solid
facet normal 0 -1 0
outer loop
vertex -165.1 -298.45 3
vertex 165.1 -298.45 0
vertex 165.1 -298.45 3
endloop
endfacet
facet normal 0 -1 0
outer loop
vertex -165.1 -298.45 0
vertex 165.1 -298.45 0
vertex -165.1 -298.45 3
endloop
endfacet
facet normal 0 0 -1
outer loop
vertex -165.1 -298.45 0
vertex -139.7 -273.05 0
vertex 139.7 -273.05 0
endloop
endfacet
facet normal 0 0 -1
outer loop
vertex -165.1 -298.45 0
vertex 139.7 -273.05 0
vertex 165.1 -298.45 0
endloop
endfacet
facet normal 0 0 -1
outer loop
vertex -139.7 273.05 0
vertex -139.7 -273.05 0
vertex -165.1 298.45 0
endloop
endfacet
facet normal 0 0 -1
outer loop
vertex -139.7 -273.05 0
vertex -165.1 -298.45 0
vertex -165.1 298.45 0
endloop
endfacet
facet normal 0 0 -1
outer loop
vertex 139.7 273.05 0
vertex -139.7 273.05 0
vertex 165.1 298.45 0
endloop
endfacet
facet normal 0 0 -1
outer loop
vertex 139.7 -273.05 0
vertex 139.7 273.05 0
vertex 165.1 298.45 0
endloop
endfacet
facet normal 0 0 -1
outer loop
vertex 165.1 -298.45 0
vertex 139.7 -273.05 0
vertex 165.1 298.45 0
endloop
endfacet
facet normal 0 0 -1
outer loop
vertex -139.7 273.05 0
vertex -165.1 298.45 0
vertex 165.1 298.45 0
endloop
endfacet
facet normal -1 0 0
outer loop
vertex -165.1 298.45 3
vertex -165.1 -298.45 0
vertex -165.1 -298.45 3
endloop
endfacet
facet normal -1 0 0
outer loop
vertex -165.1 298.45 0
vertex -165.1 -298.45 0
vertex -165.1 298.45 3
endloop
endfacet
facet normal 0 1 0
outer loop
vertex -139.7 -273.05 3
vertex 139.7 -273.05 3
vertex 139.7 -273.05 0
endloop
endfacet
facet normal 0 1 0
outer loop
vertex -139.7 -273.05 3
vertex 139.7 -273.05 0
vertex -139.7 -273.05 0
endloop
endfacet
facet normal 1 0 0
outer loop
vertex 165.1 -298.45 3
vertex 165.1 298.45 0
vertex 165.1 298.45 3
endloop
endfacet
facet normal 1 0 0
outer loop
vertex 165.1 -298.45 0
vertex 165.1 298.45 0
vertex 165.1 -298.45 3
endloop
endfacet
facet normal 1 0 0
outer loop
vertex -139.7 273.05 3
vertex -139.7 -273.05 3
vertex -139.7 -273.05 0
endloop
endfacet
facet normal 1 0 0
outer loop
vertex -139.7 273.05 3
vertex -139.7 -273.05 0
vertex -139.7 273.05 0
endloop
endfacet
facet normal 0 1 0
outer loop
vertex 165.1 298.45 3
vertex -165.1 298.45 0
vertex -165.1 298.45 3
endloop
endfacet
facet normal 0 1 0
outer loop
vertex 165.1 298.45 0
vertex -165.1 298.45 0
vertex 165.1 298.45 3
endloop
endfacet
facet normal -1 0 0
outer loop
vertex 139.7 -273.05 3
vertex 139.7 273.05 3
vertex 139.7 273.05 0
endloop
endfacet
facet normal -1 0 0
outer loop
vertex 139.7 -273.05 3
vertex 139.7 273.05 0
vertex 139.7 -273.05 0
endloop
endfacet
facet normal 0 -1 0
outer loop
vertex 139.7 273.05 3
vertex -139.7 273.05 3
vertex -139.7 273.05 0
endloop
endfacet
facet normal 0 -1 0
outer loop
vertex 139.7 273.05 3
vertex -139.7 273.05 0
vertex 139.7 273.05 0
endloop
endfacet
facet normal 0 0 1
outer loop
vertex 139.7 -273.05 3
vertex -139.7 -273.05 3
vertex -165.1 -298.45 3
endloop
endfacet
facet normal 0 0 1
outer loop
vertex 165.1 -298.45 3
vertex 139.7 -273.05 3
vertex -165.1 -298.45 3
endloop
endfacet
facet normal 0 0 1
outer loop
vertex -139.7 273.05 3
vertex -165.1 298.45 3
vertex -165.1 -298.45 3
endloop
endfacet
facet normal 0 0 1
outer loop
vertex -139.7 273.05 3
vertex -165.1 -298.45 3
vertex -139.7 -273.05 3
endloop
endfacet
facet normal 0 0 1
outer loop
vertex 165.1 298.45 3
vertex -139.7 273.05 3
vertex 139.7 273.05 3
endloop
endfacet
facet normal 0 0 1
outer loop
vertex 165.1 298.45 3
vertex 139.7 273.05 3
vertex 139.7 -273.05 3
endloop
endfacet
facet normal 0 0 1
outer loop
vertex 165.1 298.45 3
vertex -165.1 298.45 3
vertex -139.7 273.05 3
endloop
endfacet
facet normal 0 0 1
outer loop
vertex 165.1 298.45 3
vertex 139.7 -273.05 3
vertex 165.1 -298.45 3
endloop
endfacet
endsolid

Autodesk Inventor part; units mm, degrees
ref_plane "YZ Plane" through (0, 0, 0) normal (1, 0, 0) x (0, 1, 0)
ref_plane "XZ Plane" through (0, 0, 0) normal (0, 1, 0) x (-1, 0, 0)
ref_plane "XY Plane" through (0, 0, 0) normal (0, 0, 1) x (1, 0, 0)
sketch "Sketch1" plane through (0, 0, 0) normal (0, 0, 1) x (1, 0, 0)
  line L0 (-165.1, 298.45) -> (165.1, 298.45)
  line L1 (165.1, 298.45) -> (165.1, -298.45)
  line L2 (165.1, -298.45) -> (-165.1, -298.45)
  line L3 (-165.1, -298.45) -> (-165.1, 298.45)
  point P0 (0, 0)
  point P1 (0, 298.45)
  point P2 (-165.1, 0)
  dimension "d0" = 330.2
  dimension "d1" = 596.9
extrude "Extrusion1" add sketch "Sketch1" along normal blind 3
sketch "Sketch2" plane through (0, 0, 3) normal (0, 0, 1) x (1, 0, 0)
  line L0 (165.1, 298.45) -> (165.1, -298.45) projected
  line L1 (-165.1, 298.45) -> (165.1, 298.45) projected
  line L2 (-165.1, -298.45) -> (-165.1, 298.45) projected
  line L3 (165.1, -298.45) -> (-165.1, -298.45) projected
  line L4 (-139.7, 273.05) -> (139.7, 273.05)
  line L5 (139.7, 273.05) -> (139.7, -273.05)
  line L6 (139.7, -273.05) -> (-139.7, -273.05)
  line L7 (-139.7, -273.05) -> (-139.7, 273.05)
  point P0 (0, 0)
  dimension "d4" = 25.4
  dimension "d5" = 25.4
  dimension "d6" = 25.4
  dimension "d7" = 25.4
extrude "Extrusion2" cut sketch "Sketch2" against normal blind 3 contours L4 L5 L6 L7
properties part number "inside lining"
